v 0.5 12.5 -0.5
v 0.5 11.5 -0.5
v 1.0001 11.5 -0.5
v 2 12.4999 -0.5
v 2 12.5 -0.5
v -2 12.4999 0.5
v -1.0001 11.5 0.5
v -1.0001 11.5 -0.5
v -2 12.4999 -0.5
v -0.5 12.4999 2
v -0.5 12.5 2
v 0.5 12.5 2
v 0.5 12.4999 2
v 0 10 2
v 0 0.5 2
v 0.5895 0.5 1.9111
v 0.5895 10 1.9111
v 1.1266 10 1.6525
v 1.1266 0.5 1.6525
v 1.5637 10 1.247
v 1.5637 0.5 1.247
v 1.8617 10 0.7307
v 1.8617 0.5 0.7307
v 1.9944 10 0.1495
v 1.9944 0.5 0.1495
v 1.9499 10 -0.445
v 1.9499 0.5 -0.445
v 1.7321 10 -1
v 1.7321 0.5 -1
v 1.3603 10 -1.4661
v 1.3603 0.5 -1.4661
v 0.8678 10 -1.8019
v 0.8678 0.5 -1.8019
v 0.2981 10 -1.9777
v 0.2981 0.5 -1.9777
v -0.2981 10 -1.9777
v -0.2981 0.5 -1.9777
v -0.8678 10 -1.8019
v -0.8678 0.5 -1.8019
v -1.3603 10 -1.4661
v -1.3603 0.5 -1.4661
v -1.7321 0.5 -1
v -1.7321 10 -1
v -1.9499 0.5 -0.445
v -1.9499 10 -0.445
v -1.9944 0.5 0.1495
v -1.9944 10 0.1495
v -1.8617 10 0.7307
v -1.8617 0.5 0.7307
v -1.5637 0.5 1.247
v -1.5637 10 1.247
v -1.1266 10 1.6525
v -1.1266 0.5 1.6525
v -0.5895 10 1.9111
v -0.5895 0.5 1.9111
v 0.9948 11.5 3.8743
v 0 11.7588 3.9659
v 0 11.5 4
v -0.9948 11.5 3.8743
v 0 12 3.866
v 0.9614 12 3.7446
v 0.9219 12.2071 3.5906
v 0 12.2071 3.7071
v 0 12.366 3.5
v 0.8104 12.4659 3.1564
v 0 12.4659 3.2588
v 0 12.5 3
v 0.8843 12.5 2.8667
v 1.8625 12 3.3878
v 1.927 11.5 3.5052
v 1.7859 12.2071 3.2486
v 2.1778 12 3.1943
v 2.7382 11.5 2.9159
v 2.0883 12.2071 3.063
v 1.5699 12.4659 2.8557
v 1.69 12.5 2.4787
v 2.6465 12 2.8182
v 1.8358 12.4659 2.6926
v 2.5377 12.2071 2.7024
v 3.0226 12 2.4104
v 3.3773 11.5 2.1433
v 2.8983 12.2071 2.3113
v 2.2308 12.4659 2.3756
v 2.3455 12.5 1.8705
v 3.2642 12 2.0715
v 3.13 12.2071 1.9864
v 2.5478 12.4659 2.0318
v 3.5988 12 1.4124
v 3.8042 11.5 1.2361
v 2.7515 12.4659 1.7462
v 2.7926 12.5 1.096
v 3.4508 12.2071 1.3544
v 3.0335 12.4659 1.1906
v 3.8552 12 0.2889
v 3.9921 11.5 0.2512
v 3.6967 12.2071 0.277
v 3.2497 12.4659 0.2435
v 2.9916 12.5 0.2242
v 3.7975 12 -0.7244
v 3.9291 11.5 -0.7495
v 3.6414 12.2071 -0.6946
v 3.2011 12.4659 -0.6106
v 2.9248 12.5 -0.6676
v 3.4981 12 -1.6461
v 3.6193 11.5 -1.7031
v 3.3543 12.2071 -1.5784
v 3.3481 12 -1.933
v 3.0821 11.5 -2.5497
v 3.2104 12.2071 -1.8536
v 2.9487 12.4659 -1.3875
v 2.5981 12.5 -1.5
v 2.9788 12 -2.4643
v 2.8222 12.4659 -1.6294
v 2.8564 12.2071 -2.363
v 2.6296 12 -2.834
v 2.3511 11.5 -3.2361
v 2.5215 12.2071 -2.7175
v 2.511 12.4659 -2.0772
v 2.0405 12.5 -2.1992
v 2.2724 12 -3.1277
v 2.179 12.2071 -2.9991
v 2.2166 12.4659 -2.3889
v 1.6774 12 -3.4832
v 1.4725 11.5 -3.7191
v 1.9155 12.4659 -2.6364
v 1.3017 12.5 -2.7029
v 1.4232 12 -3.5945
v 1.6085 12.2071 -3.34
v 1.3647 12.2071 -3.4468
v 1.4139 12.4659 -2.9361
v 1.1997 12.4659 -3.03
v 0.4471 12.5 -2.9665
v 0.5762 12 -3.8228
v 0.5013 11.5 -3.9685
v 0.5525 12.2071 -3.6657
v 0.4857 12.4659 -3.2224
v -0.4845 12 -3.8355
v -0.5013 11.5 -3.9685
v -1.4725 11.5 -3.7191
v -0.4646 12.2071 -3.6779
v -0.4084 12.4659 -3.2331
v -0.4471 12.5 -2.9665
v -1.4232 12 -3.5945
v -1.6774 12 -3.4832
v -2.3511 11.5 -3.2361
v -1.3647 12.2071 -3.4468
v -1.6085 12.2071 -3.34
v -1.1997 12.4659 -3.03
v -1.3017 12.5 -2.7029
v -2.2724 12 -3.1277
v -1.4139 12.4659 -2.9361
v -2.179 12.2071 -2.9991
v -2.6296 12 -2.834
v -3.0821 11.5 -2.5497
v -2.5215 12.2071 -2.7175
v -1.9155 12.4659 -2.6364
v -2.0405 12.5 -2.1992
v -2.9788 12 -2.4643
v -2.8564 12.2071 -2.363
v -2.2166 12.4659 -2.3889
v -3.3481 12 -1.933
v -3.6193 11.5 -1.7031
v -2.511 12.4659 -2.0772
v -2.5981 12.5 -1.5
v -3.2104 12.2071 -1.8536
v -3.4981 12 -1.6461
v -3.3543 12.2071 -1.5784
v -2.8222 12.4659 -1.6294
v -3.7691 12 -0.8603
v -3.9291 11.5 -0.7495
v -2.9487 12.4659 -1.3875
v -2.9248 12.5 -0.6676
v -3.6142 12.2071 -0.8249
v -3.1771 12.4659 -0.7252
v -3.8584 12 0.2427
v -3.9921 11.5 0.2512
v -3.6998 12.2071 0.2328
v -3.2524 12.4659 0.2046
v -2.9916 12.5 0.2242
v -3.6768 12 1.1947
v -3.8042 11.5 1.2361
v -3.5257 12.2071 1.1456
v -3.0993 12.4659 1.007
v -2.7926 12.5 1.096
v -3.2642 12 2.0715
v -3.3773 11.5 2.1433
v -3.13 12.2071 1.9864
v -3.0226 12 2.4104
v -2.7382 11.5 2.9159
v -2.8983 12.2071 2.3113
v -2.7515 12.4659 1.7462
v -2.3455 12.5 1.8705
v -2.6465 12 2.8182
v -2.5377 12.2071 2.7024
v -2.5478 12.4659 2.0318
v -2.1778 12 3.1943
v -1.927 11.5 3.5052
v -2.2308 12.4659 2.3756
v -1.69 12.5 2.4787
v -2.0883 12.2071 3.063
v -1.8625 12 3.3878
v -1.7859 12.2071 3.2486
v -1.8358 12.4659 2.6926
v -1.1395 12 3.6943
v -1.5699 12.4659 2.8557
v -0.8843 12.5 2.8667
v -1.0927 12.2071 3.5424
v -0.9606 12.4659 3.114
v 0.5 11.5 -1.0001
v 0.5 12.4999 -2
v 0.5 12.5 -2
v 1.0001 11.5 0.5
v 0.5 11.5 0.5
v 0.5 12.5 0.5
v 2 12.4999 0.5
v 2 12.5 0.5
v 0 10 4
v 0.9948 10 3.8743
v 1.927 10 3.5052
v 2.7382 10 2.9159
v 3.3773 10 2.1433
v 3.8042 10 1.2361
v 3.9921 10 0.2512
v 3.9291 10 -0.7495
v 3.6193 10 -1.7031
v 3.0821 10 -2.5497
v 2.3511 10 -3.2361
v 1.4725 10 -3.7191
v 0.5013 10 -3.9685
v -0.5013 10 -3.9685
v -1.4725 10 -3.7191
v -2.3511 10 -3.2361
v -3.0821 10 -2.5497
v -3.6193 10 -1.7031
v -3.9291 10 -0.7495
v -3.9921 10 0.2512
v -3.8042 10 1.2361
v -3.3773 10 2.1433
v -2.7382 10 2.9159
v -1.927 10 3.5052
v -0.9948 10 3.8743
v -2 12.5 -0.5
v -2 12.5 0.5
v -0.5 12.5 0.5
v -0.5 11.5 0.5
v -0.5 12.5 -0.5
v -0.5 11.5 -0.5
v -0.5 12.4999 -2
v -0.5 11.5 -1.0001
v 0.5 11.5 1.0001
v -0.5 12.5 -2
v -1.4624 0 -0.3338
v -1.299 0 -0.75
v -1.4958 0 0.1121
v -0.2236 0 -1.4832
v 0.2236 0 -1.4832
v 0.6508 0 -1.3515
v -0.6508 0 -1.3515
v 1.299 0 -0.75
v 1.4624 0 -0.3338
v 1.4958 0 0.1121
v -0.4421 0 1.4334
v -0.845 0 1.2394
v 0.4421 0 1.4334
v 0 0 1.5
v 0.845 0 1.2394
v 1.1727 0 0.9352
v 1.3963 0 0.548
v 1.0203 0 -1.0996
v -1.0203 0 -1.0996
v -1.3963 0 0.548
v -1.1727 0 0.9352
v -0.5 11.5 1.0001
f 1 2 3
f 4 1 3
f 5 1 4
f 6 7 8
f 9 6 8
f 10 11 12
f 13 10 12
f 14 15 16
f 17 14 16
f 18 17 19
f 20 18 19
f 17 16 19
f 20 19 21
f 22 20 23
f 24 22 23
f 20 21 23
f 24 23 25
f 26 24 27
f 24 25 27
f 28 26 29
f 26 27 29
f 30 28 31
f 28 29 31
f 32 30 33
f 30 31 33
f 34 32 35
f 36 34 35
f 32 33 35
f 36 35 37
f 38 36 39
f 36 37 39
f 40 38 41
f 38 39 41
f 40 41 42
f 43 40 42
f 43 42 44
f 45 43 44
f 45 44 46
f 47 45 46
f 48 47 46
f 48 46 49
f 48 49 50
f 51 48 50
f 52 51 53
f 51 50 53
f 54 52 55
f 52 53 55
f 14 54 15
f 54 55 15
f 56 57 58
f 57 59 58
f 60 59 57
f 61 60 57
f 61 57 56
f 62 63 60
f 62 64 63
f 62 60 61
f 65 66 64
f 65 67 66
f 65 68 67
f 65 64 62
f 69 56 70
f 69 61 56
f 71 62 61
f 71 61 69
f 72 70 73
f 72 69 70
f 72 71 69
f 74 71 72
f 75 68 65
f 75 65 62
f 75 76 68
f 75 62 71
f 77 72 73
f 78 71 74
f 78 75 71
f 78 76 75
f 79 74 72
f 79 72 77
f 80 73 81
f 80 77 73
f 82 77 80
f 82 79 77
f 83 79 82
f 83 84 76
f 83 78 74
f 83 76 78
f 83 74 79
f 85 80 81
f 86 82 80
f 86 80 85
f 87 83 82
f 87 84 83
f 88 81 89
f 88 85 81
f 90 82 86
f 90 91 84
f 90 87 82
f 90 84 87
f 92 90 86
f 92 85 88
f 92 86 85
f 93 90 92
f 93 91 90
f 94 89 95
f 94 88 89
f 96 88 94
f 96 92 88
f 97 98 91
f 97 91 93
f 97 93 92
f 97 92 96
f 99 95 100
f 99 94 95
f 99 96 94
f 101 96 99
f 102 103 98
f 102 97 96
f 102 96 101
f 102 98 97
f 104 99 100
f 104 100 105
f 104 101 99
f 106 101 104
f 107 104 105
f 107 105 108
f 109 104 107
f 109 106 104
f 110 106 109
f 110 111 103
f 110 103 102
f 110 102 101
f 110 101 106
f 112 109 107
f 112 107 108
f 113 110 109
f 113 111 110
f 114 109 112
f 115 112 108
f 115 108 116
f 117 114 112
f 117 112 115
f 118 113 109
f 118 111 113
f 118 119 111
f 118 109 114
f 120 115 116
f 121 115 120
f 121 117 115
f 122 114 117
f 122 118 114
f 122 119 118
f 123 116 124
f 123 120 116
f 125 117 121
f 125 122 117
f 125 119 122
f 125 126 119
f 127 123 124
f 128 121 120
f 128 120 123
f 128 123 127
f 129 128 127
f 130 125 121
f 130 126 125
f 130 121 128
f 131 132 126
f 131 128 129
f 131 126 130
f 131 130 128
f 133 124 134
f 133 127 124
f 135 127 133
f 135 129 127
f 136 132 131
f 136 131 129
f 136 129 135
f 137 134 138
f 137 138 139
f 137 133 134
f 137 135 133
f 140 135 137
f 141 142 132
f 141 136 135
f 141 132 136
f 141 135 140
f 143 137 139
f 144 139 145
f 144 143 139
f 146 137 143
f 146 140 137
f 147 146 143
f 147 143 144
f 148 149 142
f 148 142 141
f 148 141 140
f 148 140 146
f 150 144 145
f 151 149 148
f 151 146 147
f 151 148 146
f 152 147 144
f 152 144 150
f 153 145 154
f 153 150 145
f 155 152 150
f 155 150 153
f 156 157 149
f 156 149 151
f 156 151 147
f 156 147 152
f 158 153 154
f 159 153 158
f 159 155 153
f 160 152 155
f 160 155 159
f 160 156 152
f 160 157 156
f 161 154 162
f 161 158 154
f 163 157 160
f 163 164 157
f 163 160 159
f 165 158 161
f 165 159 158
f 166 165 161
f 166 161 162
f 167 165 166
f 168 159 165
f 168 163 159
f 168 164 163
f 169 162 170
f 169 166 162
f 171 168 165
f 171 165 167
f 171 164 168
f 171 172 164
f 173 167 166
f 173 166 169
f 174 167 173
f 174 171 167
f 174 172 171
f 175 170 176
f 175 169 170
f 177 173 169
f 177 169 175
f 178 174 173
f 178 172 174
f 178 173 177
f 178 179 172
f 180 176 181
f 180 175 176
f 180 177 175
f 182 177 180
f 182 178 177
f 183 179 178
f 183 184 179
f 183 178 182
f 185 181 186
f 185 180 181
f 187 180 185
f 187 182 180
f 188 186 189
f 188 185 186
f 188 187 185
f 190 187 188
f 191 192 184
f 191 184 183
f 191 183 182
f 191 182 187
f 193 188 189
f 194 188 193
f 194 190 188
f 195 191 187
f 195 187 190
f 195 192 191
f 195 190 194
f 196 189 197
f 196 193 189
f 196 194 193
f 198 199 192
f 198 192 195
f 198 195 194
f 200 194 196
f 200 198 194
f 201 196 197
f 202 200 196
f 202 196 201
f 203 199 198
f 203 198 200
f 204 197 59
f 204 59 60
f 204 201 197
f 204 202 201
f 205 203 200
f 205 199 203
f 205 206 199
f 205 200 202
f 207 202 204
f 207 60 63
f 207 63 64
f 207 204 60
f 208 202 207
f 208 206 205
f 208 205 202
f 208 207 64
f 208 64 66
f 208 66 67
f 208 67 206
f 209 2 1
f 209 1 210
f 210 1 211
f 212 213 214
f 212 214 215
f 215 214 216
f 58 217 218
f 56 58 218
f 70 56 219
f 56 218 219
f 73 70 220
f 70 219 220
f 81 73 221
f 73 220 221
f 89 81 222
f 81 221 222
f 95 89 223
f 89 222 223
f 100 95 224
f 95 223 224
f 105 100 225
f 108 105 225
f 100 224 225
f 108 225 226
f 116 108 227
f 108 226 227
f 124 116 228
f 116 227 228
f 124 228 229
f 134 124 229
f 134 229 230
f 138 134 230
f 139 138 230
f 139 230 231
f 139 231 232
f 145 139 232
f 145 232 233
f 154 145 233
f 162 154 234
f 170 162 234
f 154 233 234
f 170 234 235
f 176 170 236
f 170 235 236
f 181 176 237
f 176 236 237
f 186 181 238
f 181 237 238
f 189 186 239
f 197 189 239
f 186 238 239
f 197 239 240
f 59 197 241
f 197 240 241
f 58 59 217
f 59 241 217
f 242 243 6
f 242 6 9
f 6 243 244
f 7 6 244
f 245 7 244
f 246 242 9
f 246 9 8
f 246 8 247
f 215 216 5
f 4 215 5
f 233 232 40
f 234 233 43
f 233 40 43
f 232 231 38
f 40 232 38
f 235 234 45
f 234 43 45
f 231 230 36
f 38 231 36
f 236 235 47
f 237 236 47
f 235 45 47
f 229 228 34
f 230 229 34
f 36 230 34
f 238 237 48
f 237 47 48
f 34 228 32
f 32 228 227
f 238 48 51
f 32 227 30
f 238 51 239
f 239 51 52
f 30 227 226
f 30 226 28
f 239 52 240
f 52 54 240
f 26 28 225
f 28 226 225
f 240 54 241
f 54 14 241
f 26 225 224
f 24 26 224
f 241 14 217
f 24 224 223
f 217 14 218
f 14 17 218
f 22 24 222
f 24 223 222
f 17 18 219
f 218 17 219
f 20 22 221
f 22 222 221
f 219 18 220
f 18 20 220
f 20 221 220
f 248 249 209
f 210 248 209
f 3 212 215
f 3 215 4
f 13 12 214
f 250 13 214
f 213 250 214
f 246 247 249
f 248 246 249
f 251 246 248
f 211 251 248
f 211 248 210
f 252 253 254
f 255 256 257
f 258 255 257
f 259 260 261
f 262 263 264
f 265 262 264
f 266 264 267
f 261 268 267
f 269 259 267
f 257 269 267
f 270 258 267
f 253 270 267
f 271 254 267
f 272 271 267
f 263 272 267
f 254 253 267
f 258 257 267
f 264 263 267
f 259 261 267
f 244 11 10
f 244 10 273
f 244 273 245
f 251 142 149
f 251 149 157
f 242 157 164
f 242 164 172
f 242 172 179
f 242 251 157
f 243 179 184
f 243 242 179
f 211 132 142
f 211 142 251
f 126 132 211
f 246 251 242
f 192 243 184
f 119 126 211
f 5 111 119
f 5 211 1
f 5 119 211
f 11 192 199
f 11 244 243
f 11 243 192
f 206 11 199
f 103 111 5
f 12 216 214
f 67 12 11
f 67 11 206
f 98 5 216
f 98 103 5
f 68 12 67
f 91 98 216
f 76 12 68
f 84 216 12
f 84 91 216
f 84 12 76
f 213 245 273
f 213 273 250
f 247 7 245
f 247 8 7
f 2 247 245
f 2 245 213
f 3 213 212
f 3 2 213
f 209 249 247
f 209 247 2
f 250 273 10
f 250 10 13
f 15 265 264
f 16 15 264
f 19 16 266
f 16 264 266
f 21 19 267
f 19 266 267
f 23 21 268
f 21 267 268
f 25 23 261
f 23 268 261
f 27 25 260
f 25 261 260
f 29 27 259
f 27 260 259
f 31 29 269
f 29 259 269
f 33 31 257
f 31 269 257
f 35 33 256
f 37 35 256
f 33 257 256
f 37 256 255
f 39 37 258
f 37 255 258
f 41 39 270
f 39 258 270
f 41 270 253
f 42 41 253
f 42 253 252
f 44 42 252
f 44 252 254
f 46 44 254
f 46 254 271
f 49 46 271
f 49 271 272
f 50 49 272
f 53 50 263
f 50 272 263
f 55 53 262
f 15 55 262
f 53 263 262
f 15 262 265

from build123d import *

# Parameters (mm, degrees)
SKETCH_1_R          = 2
EXTRUDE_1_DEPTH     = 10
SKETCH_2_R          = 4
EXTRUDE_2_DEPTH     = 2.5
FILLET_1_R          = 1
CHAMFER_1_SIZE      = 0.5
SKETCH_3_W          = 4
SKETCH_3_H          = 1
SKETCH_3_W_2        = 1
SKETCH_3_H_2        = 4
CUT_EXTRUDE_1_DEPTH = 1
CHAMFER_2_SIZE      = 1


with BuildPart() as part:
    # 草图1 → 凸台-拉伸1 (new body)
    with BuildSketch(Plane(origin=(0, 0, 0), x_dir=(1, 0, 0), z_dir=(0, 1, 0))):
        with Locations(Location((0, 0, 0), (0, 0, 270))):
            Circle(SKETCH_1_R)
    extrude(amount=EXTRUDE_1_DEPTH)

    # 草图2 → 凸台-拉伸2 (add)
    with BuildSketch(Plane(origin=(0, 10, 0), x_dir=(1, 0, 0), z_dir=(0, 1, 0))):
        with Locations(Location((0, 0, 0), (0, 0, 270))):
            Circle(SKETCH_2_R)
    extrude(amount=EXTRUDE_2_DEPTH)

    # 圆角1
    fillet_1_edges = [part.edges().sort_by_distance(p)[0] for p in [
        (0, 12.5, -4),
    ]]
    fillet(fillet_1_edges, radius=FILLET_1_R)

    # 倒角1
    chamfer_1_edges = [part.edges().sort_by_distance(p)[0] for p in [
        (0, 0, -2),
    ]]
    chamfer(chamfer_1_edges, length=CHAMFER_1_SIZE)

    # 草图3 → 切除-拉伸-薄壁1 (cut)
    with BuildSketch(Plane(origin=(0, 12.5, 0), x_dir=(1, 0, 0), z_dir=(0, 1, 0))):
        Rectangle(SKETCH_3_W, SKETCH_3_H)
        Rectangle(SKETCH_3_W_2, SKETCH_3_H_2)
    extrude(amount=-CUT_EXTRUDE_1_DEPTH, mode=Mode.SUBTRACT)

    # 倒角2
    chamfer_2_edges = [part.edges().sort_by_distance(p)[0] for p in [
        (0, 11.5, 2),
        (2, 11.5, 0),
        (0, 11.5, -2),
        (-2, 11.5, 0),
    ]]
    chamfer(chamfer_2_edges, length=CHAMFER_2_SIZE - 0.0001)  # a hair under: the kernel refuses the full size


solid = part.part
